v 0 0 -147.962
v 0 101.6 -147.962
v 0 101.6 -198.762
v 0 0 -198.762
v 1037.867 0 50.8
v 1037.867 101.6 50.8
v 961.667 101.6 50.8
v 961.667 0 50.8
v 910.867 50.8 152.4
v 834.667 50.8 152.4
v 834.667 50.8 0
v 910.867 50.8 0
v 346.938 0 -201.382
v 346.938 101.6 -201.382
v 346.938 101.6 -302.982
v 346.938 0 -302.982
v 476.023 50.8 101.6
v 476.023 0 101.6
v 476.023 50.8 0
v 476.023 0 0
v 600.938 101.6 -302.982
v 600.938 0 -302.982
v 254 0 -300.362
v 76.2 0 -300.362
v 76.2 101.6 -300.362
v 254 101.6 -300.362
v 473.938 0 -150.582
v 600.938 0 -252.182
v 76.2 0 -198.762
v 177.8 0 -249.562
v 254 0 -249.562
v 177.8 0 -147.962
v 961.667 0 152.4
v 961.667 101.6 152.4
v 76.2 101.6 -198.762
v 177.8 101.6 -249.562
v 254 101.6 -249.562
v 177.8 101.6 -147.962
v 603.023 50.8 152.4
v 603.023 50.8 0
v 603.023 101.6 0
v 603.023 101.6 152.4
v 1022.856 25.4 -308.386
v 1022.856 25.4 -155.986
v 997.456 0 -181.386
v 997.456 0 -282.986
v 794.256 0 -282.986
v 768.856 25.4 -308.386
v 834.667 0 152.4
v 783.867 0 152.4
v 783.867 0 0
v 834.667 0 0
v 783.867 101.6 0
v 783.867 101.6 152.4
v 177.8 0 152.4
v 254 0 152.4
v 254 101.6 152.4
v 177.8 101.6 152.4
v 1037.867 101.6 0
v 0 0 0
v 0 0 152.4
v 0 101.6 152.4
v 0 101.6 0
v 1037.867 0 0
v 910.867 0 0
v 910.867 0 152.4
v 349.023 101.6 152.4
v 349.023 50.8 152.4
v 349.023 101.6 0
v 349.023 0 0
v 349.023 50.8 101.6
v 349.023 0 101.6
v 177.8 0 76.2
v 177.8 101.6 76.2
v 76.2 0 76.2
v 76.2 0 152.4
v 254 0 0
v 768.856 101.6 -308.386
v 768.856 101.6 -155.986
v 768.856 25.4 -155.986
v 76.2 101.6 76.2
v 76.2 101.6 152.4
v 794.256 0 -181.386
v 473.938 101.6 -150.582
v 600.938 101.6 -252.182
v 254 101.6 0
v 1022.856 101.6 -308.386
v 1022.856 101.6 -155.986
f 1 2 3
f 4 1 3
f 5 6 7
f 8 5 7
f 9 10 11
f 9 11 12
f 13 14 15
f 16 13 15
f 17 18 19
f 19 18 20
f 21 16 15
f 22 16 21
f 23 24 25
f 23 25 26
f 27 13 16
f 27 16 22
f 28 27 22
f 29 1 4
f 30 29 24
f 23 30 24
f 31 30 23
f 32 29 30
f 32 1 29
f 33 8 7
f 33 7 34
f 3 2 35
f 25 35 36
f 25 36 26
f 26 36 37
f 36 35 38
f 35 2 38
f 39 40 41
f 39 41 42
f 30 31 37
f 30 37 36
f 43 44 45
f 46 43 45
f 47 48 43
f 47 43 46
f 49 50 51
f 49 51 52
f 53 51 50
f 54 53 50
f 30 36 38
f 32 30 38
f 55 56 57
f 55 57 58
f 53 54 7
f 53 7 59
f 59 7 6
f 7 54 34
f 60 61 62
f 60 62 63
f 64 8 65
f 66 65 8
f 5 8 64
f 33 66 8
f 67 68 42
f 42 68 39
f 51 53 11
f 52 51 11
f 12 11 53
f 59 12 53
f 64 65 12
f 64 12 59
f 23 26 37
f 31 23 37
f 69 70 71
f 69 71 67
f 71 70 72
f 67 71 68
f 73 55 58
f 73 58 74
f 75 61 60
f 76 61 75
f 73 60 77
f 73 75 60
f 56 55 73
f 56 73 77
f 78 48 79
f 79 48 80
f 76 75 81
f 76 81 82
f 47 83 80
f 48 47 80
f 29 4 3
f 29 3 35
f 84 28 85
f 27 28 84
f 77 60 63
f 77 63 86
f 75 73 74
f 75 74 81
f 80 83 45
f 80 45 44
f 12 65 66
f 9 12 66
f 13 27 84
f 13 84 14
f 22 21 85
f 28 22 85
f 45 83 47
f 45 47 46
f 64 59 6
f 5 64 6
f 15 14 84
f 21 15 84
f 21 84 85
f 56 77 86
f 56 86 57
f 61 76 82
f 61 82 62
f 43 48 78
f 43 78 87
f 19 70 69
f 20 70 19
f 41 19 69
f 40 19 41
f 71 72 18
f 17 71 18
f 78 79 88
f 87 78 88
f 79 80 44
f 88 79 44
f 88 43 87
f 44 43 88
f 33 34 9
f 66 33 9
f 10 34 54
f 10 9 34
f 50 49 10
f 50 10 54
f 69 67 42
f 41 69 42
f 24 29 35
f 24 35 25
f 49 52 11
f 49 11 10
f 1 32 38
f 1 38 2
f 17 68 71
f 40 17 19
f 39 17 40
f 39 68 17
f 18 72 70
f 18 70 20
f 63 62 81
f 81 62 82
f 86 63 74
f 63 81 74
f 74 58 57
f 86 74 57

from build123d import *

# Parameters (mm, degrees)
F1_DEPTH  = 101.6
F2_W      = 254
F2_H      = 152.4
F3_DEPTH  = 101.6
F5_DEPTH  = 50.8
F6_W      = 50.8
F6_H      = 152.4
F6_W_2    = 76.2
F7_DEPTH  = 101.6
F8_W      = 76.2
F8_H      = 152.4
F9_DEPTH  = 50.8
F11_DEPTH = 101.6
F13_DEPTH = 101.6
F14_W     = 254
F14_H     = 152.4
F15_DEPTH = 101.6
F17_DEPTH = 254
F19_DEPTH = 152.4


with BuildPart() as f1:
    # F0 (on Front) → F1 (new body)
    with BuildSketch(Plane.XZ):
        Polygon((0, 152.4), (0, 0), (254, 0), (254, 152.4), (177.8, 152.4), (177.8, 76.2), (76.2, 76.2), (76.2, 152.4), align=None)
    extrude(amount=-F1_DEPTH)


with BuildPart() as f3:
    # F2 (on Front) → F3 (new body)
    with BuildSketch(Plane.XZ):
        with Locations((476.023339, 76.2)):
            Rectangle(F2_W, F2_H)
    extrude(amount=-F3_DEPTH)

    # F4 (on face) → F5 (cut)
    with BuildSketch(Plane.XZ):
        Polygon((603.023339, 152.4), (349.023339, 152.4), (349.023339, 101.6), (476.023339, 101.6), (476.023339, 0), (603.023339, 0), align=None)
    extrude(amount=-F5_DEPTH, mode=Mode.SUBTRACT)


with BuildPart() as f7:
    # F6 (on Front) → F7 (new body)
    with BuildSketch(Plane.XZ):
        with Locations((809.266603, 76.2)):
            Rectangle(F6_W, F6_H)
        Polygon((910.866603, 152.4), (910.866603, 0), (1037.866603, 0), (1037.866603, 50.8), (961.666603, 50.8), (961.666603, 152.4), align=None)
        with Locations((872.766603, 76.2)):
            Rectangle(F6_W_2, F6_H)
    extrude(amount=-F7_DEPTH)

    # F8 (on face) → F9 (cut)
    with BuildSketch(Plane.XZ):
        with Locations((872.766603, 76.2)):
            Rectangle(F8_W, F8_H)
    extrude(amount=-F9_DEPTH, mode=Mode.SUBTRACT)


with BuildPart() as f11:
    # F10 (on Front) → F11 (new body)
    with BuildSketch(Plane.XZ):
        Polygon((177.8, -147.962385), (0, -147.962385), (0, -198.762385), (76.2, -198.762385), (76.2, -300.362385), (254, -300.362385), (254, -249.562385), (177.8, -249.562385), align=None)
    extrude(amount=-F11_DEPTH)


with BuildPart() as f13:
    # F12 (on Front) → F13 (new body)
    with BuildSketch(Plane.XZ):
        Polygon((346.938163, -201.381824), (346.938163, -302.981824), (600.938163, -302.981824), (600.938163, -252.181824), (473.938163, -150.581824), align=None)
    extrude(amount=-F13_DEPTH)


with BuildPart() as f15:
    # F14 (on Front) → F15 (new body)
    with BuildSketch(Plane.XZ):
        with Locations((895.855677, -232.186042)):
            Rectangle(F14_W, F14_H)
    extrude(amount=-F15_DEPTH)

    # F16 (on face) → F17 (cut)
    with BuildSketch(Plane.YZ.offset(1022.855677)):
        Polygon((0, -181.386042), (25.4, -155.986042), (0, -155.986042), align=None)
        Polygon((25.4, -308.386042), (0, -282.986042), (0, -308.386042), align=None)
    extrude(amount=-F17_DEPTH, mode=Mode.SUBTRACT)

    # F18 (on face) → F19 (cut)
    with BuildSketch(Plane.XY.offset(-155.986042)):
        Polygon((794.255677, 0), (768.855677, 25.4), (768.855677, 0), align=None)
        Polygon((1022.855677, 0), (1022.855677, 25.4), (997.455677, 0), align=None)
    extrude(amount=-F19_DEPTH, mode=Mode.SUBTRACT)


solid = Compound([f1.part, f3.part, f7.part, f11.part, f13.part, f15.part])
